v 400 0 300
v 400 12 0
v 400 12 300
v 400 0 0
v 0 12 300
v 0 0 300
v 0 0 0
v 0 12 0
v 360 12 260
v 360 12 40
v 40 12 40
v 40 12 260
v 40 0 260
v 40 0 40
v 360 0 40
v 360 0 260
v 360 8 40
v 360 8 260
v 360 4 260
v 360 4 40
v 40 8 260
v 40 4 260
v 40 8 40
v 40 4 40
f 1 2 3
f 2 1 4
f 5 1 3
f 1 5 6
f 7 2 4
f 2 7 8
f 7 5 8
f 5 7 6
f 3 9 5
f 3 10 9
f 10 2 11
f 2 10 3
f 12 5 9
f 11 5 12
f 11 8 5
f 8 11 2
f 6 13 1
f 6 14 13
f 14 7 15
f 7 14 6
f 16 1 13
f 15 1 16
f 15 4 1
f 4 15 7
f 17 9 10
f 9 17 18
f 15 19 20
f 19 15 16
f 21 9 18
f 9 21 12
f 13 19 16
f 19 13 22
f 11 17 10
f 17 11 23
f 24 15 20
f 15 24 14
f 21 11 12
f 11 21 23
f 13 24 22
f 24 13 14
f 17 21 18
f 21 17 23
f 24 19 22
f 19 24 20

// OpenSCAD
// file: ../params.scad
// Shared millimetre parameters. Keep in lockstep with freecad/params.py.
// Module scale: 150 kg/day wet train. Walls are CPVC sheet, not metal.

$fn = 36;

WALL        = 12;     // CPVC sheet thickness
FLOOR       = 16;     // floor plate (trough sits on this)

// LEACH CSTR 1 — inside liquor box
CSTR_L      = 2000;
CSTR_W      = 1200;
CSTR_H      = 1400;   // liquid + freeboard
FREEBOARD   = 200;

// CSTR 2 weir (same vessel, +X wall)
WEIR_W      = 450;
WEIR_CREST  = CSTR_H - FREEBOARD;   // from inner floor
WEIR_SLOT_H = 80;
WEIR_LIP    = 120;    // external spout projection

// CSTR 3 floor auger — injection-molded PVC / FG
AUGER_D     = 140;    // flight OD
AUGER_SHAFT = 40;
AUGER_PITCH = 110;
AUGER_TROUGH_W = 180;
AUGER_TROUGH_H = 110;
AUGER_OFFSET_Y = 280; // trough centreline from inner -Y wall
AUGER_INCLINE  = 28;  // deg, lifts out of liquor toward +X

// mixer / nozzles (lid)
MIXER_D     = 50;
GAS_D       = 80;     // acid-gas takeoff
DROP_X      = 80;     // inner-X of shred drop slot
DROP_L      = 400;
DROP_W      = 250;
DROP_COAM   = 80;     // raised coaming around the slot

// LEACHATE PUMP / coarse strainer — −X wall, opposite the weir
PUMP_D      = 80;     // DN80
PUMP_Z      = 450;    // centreline above inner floor (submerged)
PUMP_Y      = 900;    // centreline from inner −Y (away from auger)
STRAINER_L  = 180;
STRAINER_W  = 140;
STRAINER_H  = 160;

// mezzanine feed train
MEZZ_H      = 2200;   // platform top above tank outer floor
MEZZ_L      = 1600;   // platform length in −X
MEZZ_THK    = 12;
HOPPER_L    = 700;
HOPPER_W    = 600;
HOPPER_H    = 800;
SHRED_L     = 500;
SHRED_W     = 500;
SHRED_H     = 450;
CONV_W      = 240;
CONV_H      = 120;
CONV_PLATE  = 6;      // trough plate
CONV_FLANGE = 40;
CONV_SPRING_D = 50;
CONV_SPRING_H = 80;
CONV_BOLT   = 10;     // M10 clearance
CONV_LEN    = 1800;   // default standalone length; plant instance is computed
DUST_D      = 150;    // dust-hood outlet to DUST header
AUGER_LIFT_L = 700;

// dewater belts + split (Phase A 4–6)
FDEW_L      = 1800;
FDEW_W      = 450;
FDEW_H      = 80;
FDEW_RISE   = 120;    // solids end higher so liquor runs back to weir
SDEW_L      = 1400;
SDEW_W      = 220;
SDEW_H      = 80;
SPLIT_L     = 600;
SPLIT_W     = 500;
SPLIT_H     = 400;
STUB_L      = 400;
STUB_W      = 300;
STUB_H      = 250;

// EW funnel cell
EW_L        = 600;    // along aisle (overflow direction)
EW_W        = 420;    // anode-cathode depth
EW_H        = 650;    // rectangular body
EW_FUNNEL_H = 220;
EW_VALVE_D  = 50;
EW_VALVE_L  = 60;
EW_MEM_T    = 4;      // CEM
EW_SLOT     = 10;     // membrane cassette slot
EW_PITCH    = 750;    // aisle spacing, centre to centre
AISLE_X0    = 200;
AISLE_Y     = -(EW_W + 2*WALL) - 400;
AISLE_Z     = 400;
BUND_H      = 150;
BUND_PAD    = 250;
SUMP_L      = 400;
SUMP_W      = 400;
SUMP_H      = 300;
VDF_D       = 700;
VDF_L       = 900;
PAIL_W      = 180;
HDR_D       = 80;
HDR_Z       = 1400;
PYRO_D      = 320;
PYRO_L      = 2800;

// Campus envelopes — lockstep with freecad/params.py
FARM_X=12000; FARM_Y=8000; FARM_L=12000; FARM_W=8000; FARM_H=4500;
FAB_X=12000;  FAB_Y=-6000; FAB_L=8000;   FAB_W=6000;  FAB_H=4000;
HAB_X=-8000;  HAB_Y=8000;  HAB_L=8000;   HAB_W=6000;  HAB_H=3200;
CRYO_X=-6000; CRYO_Y=-4000; CRYO_L=4000; CRYO_W=3000; CRYO_H=3000;
MFG_X=2000;   MFG_Y=9000;  MFG_L=6000;   MFG_W=4000;  MFG_H=3500;

LIFE_Z_GREY=900; LIFE_Z_UPW=1100; LIFE_Z_ETCH=1300;
LIFE_Z_O2=2800; LIFE_Z_N2=3000; LIFE_Z_CO2=3200;
LIFE_D_GREY=50; LIFE_D_UPW=40; LIFE_D_ETCH=32;
LIFE_D_GAS=25; LIFE_D_CO2=40;
// main file
// ZnBr2 stack IEM frame (CEM, drawn blue). SEM Tech style.
include <../params.scad>;

fw = 400;
fh = 300;
ft = 12;
open_w = 320;
open_h = 220;

module frame() {
    difference() {
        cube([fw, ft, fh]);
        translate([(fw-open_w)/2, -1, (fh-open_h)/2])
            cube([open_w, ft + 2, open_h]);
    }
    color("steelblue")
    translate([(fw-open_w)/2, ft/2 - 2, (fh-open_h)/2])
        cube([open_w, 4, open_h]);
}

frame();
